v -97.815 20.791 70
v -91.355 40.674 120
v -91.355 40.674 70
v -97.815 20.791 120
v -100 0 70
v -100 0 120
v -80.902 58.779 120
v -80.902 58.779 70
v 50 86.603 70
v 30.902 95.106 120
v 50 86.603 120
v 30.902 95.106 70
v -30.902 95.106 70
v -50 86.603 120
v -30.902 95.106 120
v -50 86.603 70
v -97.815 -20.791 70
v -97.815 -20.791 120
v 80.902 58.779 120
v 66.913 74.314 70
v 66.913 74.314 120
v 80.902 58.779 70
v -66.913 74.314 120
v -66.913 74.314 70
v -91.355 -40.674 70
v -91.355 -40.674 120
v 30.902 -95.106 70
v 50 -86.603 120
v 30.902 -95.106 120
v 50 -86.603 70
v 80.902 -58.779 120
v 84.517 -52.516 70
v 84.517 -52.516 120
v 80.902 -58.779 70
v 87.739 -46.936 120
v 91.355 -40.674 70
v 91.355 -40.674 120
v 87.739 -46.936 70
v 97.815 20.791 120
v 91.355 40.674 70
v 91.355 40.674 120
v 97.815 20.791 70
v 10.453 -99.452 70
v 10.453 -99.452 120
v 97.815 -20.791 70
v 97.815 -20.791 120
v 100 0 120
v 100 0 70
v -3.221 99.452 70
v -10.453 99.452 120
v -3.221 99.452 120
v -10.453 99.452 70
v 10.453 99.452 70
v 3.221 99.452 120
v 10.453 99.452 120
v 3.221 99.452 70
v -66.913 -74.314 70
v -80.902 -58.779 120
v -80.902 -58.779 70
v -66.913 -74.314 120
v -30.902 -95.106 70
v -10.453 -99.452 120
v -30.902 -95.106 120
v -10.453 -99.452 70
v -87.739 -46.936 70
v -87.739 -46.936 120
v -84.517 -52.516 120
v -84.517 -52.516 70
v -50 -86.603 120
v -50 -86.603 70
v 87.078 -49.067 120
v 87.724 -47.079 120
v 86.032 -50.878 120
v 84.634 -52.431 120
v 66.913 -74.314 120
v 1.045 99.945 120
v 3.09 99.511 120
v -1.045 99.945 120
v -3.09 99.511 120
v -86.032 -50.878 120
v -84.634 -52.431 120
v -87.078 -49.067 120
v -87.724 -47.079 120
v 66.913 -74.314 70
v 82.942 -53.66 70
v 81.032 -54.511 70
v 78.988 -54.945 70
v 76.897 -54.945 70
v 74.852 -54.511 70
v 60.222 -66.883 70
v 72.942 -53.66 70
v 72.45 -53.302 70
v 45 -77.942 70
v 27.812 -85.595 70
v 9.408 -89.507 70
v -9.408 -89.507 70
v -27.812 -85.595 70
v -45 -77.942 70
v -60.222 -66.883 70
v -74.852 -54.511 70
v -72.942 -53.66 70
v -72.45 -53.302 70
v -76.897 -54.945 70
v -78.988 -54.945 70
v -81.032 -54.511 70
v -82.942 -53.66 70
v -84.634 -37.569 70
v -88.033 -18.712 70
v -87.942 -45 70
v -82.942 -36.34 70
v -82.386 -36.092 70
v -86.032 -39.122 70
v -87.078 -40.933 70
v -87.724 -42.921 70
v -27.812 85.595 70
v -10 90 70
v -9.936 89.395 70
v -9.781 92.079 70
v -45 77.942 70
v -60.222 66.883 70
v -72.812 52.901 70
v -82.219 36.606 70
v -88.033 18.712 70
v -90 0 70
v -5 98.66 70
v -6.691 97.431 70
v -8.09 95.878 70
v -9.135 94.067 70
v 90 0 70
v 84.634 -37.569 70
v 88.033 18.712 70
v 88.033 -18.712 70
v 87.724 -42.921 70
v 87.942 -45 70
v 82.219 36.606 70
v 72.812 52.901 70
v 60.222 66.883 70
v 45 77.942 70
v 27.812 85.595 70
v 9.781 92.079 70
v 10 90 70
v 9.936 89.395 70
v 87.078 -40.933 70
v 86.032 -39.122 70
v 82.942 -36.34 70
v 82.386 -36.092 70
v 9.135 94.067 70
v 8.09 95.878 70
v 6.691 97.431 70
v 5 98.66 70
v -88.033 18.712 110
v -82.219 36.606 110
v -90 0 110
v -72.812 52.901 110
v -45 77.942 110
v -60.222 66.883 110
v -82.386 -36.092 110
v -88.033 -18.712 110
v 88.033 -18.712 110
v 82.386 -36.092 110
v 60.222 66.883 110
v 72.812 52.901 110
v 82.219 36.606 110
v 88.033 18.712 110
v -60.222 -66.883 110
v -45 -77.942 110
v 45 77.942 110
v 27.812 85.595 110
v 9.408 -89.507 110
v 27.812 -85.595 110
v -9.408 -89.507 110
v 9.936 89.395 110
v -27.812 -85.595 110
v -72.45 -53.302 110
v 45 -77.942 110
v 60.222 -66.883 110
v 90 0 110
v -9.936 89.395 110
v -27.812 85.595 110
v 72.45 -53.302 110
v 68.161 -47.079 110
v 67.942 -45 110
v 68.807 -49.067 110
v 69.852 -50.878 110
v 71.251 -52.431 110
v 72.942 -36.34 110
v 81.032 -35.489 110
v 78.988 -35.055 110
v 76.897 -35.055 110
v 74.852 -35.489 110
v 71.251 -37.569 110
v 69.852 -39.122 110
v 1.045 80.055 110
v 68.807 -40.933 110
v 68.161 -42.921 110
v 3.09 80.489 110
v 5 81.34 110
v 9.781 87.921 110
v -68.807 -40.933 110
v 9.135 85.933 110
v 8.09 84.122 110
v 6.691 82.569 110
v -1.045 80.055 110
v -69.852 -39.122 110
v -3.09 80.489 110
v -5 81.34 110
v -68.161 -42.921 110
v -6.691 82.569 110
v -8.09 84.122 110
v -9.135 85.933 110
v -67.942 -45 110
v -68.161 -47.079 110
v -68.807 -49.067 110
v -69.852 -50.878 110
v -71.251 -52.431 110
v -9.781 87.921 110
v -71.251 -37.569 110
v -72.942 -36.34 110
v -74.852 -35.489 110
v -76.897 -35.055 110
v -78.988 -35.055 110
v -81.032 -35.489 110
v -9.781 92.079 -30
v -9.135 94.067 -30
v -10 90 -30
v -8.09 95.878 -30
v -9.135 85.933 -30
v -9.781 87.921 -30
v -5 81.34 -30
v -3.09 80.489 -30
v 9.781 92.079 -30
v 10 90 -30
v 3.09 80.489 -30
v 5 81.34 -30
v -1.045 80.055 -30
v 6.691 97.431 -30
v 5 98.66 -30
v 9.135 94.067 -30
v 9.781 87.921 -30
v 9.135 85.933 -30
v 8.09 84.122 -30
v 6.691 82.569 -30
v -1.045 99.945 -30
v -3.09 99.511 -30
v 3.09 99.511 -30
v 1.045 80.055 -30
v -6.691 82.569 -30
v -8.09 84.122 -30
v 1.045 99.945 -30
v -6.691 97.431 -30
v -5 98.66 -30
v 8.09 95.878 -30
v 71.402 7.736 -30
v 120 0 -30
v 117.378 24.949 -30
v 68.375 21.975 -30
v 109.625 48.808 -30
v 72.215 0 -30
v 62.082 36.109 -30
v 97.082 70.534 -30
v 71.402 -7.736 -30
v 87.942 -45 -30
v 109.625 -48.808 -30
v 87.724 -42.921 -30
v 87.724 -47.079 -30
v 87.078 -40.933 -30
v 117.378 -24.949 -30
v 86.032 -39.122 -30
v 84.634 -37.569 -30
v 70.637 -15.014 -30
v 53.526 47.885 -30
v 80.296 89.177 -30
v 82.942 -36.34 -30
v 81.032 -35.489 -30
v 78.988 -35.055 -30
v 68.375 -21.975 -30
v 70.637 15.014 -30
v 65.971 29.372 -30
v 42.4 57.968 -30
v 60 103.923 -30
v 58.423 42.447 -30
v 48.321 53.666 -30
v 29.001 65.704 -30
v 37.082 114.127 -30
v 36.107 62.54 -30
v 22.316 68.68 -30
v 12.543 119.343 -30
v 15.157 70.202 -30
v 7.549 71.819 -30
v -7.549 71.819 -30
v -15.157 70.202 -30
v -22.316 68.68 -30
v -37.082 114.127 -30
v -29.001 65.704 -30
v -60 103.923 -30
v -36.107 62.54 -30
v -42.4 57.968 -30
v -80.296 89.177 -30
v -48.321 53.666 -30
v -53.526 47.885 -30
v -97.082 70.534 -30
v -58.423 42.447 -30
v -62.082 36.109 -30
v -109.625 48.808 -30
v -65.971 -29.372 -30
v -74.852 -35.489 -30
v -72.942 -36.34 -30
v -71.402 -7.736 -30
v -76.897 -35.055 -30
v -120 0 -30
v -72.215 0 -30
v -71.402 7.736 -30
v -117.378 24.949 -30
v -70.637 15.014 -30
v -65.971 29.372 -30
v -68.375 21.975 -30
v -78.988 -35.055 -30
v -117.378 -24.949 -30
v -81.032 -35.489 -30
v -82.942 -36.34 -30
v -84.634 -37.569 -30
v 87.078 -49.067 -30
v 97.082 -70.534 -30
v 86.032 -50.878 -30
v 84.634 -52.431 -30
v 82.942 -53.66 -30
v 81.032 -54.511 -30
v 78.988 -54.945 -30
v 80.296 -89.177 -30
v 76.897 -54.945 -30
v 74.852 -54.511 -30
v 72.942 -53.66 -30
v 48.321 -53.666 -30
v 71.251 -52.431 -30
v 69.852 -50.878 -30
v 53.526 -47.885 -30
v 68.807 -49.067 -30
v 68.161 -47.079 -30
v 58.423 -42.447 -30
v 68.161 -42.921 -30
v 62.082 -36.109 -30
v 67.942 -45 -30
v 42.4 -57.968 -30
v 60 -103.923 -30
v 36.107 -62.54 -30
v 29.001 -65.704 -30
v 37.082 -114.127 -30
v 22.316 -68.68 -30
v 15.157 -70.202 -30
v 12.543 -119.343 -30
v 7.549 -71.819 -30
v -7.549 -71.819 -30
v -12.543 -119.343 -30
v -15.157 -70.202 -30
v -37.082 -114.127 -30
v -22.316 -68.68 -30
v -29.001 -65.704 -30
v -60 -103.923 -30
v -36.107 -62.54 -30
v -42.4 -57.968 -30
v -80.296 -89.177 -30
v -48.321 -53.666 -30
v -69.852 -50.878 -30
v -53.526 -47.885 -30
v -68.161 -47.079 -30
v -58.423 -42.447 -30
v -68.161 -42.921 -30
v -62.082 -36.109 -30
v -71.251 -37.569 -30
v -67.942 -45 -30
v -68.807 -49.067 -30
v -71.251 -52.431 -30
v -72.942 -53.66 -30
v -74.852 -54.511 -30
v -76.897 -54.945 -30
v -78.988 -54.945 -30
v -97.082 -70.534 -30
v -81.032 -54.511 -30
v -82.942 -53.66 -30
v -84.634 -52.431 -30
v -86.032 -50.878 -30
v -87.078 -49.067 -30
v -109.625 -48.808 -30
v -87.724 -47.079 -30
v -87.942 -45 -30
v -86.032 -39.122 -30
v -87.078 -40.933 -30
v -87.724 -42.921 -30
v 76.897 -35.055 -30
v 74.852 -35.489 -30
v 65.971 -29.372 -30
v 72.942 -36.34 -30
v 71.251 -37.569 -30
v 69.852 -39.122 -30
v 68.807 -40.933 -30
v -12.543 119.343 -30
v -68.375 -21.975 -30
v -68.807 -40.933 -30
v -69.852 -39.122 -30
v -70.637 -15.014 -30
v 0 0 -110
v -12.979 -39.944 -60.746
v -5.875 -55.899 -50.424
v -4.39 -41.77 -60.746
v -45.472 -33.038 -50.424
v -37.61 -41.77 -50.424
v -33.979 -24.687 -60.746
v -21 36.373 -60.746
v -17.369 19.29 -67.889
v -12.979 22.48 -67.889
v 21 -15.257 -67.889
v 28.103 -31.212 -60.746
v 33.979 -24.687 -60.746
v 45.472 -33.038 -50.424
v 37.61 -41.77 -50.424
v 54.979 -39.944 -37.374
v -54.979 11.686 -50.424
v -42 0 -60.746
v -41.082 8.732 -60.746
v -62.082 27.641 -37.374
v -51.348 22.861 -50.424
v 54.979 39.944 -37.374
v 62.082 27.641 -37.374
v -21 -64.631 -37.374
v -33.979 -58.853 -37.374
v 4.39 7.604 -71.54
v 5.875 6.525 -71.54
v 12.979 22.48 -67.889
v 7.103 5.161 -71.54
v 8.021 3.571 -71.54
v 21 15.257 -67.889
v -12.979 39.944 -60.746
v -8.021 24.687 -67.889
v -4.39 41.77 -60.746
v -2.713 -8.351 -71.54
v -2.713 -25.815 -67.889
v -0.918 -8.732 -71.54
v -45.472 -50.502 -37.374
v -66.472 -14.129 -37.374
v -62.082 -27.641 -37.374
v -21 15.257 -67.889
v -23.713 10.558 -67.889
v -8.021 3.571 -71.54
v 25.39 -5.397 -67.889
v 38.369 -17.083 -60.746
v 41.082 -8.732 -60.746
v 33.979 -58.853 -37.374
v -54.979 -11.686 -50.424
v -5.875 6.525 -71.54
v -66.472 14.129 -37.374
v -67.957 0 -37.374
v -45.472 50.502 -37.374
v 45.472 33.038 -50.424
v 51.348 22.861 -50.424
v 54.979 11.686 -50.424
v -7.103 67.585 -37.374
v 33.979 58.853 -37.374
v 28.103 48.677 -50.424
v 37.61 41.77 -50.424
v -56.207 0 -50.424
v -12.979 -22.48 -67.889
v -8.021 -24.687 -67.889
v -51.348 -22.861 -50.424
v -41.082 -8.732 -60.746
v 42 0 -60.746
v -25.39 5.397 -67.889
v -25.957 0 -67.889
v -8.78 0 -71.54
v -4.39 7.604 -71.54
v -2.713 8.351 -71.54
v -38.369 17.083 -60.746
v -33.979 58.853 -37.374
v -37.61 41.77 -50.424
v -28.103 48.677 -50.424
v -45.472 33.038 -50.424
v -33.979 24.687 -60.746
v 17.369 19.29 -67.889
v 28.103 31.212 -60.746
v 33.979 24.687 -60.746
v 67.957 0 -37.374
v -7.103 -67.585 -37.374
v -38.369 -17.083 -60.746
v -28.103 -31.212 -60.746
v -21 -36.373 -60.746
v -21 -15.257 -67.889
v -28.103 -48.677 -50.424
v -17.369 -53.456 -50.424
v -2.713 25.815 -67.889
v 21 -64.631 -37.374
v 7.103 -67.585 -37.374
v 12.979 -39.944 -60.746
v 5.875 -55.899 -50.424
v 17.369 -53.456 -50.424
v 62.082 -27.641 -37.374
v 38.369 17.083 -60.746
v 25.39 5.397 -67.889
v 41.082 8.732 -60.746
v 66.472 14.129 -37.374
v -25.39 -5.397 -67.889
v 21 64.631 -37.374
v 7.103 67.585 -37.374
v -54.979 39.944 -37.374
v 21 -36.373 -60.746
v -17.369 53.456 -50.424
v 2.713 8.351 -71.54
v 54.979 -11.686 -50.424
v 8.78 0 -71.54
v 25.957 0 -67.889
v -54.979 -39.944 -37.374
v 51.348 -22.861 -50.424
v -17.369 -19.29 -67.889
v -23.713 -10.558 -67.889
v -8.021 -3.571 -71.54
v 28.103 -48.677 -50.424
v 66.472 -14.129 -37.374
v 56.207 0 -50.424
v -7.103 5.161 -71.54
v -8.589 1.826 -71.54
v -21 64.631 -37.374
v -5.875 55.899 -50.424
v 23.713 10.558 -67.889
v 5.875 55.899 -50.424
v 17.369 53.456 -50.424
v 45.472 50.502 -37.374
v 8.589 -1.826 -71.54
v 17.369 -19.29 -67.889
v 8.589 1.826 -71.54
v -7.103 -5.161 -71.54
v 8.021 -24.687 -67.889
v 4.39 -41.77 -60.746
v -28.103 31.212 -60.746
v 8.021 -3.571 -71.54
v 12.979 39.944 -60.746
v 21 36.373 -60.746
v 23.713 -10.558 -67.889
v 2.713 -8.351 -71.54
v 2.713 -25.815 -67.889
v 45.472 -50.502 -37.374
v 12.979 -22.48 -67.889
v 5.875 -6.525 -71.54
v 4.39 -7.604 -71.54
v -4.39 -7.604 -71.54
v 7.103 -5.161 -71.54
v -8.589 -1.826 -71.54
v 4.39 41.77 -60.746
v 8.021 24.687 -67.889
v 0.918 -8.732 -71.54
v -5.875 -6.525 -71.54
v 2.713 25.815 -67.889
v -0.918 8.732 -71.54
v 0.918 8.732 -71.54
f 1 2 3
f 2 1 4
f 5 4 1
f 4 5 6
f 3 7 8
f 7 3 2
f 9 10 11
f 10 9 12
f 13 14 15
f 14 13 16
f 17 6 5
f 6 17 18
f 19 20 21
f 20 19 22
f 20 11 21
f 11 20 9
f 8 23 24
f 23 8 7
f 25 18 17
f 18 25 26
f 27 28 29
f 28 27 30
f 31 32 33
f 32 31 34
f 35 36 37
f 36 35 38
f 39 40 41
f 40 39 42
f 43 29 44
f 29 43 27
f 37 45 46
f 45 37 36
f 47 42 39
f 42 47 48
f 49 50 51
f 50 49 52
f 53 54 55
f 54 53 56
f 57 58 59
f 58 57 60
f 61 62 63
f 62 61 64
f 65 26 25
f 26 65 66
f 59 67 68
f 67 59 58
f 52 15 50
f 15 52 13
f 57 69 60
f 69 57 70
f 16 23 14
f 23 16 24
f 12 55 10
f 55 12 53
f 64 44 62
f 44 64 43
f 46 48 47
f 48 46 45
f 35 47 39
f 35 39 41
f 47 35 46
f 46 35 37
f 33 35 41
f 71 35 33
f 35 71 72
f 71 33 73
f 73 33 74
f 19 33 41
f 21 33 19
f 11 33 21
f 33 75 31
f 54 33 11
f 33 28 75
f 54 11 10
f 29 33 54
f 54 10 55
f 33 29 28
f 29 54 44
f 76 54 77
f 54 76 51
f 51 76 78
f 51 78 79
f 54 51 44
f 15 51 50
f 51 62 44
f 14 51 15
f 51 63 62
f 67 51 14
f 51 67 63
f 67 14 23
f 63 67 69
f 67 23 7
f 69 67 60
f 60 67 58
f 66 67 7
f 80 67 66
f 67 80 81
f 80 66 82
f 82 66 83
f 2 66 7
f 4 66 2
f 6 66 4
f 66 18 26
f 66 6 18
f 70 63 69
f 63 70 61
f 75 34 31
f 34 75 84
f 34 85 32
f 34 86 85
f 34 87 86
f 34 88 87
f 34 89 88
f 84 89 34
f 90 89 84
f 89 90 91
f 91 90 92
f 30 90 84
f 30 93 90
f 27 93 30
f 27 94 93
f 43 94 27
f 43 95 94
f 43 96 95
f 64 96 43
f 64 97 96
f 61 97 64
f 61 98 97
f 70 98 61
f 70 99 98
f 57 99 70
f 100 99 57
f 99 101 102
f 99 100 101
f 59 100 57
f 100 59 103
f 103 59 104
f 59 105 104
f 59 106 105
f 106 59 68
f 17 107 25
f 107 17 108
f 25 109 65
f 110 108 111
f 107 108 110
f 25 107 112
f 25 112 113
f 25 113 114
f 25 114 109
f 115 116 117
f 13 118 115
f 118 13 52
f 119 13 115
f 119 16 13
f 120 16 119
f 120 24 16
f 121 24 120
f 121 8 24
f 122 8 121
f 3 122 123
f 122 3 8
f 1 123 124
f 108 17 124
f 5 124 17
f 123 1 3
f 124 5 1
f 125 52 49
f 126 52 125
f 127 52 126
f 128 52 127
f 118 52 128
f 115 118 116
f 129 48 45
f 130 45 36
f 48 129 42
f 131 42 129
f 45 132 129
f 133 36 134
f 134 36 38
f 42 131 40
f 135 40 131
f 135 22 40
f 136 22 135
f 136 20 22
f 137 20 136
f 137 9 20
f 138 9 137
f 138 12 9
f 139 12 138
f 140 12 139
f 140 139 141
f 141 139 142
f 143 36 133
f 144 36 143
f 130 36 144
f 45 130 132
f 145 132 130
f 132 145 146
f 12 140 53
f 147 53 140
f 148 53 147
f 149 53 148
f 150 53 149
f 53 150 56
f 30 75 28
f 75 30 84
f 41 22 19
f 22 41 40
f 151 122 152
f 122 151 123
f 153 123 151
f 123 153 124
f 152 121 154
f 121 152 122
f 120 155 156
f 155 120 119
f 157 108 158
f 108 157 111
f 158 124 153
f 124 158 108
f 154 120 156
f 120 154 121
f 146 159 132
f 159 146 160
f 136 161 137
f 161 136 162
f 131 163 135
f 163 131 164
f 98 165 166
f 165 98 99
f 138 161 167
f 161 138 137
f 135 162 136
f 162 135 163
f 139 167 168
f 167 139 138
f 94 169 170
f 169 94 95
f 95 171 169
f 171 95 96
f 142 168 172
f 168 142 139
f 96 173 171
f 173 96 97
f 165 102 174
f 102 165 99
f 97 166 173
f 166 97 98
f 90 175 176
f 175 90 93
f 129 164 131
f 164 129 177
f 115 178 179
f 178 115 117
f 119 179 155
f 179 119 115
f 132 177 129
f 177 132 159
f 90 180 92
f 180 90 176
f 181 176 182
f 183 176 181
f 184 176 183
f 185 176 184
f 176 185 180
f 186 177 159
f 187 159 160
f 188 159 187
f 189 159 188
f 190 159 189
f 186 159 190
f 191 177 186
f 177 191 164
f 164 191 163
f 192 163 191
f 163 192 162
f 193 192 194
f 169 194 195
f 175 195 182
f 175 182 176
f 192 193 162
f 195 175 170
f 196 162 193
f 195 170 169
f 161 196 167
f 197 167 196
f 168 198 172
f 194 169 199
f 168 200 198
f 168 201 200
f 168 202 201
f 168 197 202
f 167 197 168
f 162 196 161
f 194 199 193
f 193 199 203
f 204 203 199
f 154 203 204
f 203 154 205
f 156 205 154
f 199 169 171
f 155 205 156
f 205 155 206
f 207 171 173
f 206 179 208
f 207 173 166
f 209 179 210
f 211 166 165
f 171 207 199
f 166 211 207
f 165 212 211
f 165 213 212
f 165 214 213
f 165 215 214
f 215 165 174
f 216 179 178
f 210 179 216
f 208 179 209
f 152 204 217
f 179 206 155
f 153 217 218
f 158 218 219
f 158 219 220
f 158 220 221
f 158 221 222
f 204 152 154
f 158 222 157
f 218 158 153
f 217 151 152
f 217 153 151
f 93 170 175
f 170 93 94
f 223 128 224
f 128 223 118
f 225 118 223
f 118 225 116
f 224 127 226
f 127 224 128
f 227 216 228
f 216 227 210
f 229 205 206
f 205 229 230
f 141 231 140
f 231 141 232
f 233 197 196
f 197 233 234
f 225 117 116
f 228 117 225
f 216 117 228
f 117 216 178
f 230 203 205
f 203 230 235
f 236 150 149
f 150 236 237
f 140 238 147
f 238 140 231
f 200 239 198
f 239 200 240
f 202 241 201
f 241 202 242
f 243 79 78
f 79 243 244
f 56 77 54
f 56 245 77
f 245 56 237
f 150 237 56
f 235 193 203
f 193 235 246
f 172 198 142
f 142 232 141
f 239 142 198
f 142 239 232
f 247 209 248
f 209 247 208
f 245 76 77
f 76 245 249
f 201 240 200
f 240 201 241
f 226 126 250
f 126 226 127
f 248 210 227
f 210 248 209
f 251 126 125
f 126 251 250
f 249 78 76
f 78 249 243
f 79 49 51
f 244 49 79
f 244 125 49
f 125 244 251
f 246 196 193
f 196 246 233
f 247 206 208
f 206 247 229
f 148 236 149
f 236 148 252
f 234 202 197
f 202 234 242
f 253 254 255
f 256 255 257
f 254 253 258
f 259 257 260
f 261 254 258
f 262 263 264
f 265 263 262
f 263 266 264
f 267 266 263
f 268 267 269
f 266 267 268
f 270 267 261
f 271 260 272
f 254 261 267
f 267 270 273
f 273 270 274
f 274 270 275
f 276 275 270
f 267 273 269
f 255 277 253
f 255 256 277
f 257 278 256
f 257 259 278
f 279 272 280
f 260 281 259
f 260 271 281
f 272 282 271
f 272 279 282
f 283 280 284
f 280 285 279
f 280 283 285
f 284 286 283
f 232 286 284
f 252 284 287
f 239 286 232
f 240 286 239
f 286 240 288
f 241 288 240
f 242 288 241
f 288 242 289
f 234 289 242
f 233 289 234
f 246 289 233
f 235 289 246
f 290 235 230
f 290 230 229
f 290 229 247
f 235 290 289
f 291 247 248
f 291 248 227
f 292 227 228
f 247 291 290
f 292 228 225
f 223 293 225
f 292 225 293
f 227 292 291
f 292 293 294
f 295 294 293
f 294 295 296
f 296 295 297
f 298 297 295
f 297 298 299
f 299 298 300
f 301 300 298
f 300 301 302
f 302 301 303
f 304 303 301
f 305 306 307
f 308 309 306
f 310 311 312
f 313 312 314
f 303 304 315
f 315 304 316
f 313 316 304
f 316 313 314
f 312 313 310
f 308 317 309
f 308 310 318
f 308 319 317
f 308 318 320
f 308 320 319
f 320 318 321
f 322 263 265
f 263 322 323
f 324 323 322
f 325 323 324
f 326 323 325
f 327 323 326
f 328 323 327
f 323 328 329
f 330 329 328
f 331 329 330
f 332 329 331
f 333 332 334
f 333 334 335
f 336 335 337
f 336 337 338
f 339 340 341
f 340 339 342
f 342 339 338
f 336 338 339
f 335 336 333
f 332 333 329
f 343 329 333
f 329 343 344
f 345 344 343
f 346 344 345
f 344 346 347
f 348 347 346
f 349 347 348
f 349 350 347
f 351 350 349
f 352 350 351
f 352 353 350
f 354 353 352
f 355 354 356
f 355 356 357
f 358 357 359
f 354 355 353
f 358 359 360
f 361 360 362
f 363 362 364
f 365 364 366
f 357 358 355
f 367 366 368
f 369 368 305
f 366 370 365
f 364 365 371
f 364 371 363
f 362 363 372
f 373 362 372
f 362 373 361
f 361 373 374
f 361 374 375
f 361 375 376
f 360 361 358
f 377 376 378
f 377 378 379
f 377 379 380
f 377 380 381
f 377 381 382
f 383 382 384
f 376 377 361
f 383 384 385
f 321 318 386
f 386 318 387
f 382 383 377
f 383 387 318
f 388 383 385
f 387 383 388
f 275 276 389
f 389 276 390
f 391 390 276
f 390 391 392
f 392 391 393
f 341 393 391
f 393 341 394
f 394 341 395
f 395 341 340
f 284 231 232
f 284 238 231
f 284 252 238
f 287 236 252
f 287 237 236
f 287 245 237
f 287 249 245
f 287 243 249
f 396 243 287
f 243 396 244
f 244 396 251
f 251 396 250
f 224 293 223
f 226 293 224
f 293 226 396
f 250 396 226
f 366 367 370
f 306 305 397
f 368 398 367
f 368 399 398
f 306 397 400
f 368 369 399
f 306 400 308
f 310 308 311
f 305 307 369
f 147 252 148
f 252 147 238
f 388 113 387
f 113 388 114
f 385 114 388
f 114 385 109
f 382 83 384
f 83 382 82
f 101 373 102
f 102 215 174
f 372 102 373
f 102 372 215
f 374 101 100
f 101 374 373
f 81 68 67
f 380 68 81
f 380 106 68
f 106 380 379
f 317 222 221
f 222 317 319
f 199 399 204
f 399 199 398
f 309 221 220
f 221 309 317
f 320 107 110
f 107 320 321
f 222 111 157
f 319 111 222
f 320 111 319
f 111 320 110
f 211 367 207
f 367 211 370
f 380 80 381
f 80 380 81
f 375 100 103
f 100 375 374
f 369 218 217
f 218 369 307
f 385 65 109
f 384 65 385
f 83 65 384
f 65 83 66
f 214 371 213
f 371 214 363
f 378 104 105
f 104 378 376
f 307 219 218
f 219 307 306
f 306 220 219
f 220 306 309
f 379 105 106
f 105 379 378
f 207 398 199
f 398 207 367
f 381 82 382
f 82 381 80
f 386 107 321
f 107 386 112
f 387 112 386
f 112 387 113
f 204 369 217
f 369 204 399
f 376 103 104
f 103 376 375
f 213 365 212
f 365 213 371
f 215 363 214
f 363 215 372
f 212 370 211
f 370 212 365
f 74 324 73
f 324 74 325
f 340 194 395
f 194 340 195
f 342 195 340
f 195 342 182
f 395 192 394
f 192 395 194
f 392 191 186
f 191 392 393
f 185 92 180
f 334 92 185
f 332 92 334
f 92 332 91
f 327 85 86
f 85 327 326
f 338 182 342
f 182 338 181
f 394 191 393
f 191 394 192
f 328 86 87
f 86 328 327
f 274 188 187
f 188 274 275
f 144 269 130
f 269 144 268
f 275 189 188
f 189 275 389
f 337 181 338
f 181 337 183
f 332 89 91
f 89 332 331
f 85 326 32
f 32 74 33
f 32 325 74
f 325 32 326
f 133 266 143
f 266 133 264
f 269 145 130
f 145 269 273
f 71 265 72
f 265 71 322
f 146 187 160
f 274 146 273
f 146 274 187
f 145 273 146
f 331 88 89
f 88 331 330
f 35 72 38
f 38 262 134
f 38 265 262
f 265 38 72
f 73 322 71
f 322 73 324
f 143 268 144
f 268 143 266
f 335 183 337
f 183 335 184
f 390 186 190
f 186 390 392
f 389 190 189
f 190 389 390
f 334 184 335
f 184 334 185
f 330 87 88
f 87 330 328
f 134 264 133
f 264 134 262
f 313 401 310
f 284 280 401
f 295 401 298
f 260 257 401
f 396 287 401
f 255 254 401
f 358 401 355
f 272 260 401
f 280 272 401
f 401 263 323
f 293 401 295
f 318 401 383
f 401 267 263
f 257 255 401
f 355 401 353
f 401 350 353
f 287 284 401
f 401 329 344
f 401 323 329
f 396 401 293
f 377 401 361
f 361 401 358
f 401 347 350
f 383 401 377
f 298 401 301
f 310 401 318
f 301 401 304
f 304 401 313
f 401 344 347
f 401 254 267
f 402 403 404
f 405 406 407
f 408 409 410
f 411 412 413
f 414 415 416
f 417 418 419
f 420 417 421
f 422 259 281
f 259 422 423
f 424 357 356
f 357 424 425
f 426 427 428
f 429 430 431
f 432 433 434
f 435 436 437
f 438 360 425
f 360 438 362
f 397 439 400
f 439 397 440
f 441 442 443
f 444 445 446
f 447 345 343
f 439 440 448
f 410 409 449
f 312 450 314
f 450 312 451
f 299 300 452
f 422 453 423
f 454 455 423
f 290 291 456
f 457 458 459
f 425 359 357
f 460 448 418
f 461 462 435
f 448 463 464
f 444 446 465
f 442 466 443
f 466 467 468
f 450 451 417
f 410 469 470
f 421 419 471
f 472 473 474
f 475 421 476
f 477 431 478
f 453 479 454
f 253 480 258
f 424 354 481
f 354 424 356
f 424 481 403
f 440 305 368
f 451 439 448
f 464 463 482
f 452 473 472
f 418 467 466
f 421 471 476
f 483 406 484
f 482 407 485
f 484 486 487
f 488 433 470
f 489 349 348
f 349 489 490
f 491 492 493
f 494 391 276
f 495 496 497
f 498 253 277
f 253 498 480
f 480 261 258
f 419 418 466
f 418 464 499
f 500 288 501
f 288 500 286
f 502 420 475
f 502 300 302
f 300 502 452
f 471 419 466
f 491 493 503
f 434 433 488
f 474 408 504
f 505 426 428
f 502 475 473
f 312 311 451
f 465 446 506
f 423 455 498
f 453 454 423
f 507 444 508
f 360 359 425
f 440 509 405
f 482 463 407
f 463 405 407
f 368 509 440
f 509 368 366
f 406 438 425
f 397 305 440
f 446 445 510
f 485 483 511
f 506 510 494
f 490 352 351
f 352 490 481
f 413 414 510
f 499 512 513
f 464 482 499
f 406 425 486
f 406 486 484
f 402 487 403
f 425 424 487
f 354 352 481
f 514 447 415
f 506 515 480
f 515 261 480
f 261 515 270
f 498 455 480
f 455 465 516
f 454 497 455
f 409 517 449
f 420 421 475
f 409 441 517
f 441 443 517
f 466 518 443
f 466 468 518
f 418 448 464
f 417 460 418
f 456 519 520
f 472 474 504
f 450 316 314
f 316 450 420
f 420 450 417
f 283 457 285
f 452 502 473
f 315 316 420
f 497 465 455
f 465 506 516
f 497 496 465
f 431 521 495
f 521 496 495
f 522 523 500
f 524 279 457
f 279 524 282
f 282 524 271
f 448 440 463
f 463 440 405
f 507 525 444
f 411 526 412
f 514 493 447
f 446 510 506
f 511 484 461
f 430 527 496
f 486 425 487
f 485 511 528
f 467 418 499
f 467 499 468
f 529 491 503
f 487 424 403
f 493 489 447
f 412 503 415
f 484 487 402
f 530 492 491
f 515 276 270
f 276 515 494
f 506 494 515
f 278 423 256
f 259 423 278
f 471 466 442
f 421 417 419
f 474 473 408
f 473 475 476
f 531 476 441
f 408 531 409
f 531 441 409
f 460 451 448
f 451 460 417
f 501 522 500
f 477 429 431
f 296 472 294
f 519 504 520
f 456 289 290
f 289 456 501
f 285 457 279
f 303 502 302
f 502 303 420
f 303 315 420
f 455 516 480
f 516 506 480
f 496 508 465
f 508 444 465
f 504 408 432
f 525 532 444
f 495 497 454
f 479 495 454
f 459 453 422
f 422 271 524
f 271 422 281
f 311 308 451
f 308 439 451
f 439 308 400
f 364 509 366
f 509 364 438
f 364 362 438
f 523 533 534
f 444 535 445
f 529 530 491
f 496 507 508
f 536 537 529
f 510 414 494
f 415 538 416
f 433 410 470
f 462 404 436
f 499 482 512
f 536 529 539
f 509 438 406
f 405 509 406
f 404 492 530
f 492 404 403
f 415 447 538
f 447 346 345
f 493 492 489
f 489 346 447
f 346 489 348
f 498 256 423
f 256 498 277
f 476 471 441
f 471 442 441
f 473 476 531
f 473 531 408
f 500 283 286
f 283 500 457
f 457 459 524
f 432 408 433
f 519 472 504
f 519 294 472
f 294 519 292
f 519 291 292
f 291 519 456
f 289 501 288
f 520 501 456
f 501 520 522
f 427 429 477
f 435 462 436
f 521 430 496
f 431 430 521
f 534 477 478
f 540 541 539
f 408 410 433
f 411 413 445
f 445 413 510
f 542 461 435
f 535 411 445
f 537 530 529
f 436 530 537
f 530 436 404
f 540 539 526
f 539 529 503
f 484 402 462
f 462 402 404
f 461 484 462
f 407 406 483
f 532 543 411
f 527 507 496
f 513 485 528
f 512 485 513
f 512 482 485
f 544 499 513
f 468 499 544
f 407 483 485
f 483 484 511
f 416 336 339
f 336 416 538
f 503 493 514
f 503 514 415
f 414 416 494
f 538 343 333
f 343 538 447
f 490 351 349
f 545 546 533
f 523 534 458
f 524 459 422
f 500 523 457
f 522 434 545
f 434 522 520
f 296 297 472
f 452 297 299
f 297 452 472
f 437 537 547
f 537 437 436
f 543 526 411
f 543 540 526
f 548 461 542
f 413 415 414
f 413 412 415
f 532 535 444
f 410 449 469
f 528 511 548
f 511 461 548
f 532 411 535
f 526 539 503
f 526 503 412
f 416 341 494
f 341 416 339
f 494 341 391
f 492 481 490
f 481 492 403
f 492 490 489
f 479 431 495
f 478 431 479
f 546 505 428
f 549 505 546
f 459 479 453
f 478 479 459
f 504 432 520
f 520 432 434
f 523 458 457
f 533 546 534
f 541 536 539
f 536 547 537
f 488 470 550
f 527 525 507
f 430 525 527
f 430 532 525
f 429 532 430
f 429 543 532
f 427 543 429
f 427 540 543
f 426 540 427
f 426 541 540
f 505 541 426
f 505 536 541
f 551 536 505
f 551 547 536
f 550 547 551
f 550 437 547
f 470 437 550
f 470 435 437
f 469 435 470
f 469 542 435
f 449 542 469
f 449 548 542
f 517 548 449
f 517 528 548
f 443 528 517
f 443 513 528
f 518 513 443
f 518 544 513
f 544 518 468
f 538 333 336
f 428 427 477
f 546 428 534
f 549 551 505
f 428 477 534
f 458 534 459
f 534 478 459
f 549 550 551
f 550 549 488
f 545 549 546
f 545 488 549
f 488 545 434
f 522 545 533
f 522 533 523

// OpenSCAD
  //Parametri
  base_raggio = 100;
  base_altezza = 50;
  base_spessoreb = 10;
  base_b = base_raggio - base_spessoreb;
  colonna_altezza = 150;
  colonna_n = 3;
  colonna_raggio = 10;
  tetto_raggio = base_raggio + (base_raggio*20/100);    
  tetto_altezza = 80;  
  sfera_raggio = tetto_raggio - (tetto_raggio*30/100);

module mangiatoia()
{
  //Disegno della base
  translate([0, 0, -120]) {
    difference() {
      cylinder(h = base_altezza, r = base_raggio);
      translate([0, 0, colonna_raggio]) cylinder(h = base_altezza, r = base_b);
      //translate([base_raggio, 0, 35]) cube(50, center = true);
    }
    // Disegno delle colonne
    for (i = [0:(colonna_n-1)]) {
      echo(360*i/colonna_n, sin(360*i/colonna_n)*base_b, cos(360*i/colonna_n)*base_b);
      translate([sin(360*i/colonna_n)*base_b, cos(360*i/colonna_n)*base_b, 0 ])
        cylinder(h = colonna_altezza, r=colonna_raggio);
    }
    // Disegno del tetto
    difference() {
    translate([0, 0, colonna_altezza])
      cylinder(h = tetto_altezza, r1 = tetto_raggio, r2 = 0);
    translate([0, 0, colonna_altezza - sfera_raggio/2])
      sphere(sfera_raggio);
    }
  }
}

echo(version=version());

rotate(a=[0,180,0]) mangiatoia();
